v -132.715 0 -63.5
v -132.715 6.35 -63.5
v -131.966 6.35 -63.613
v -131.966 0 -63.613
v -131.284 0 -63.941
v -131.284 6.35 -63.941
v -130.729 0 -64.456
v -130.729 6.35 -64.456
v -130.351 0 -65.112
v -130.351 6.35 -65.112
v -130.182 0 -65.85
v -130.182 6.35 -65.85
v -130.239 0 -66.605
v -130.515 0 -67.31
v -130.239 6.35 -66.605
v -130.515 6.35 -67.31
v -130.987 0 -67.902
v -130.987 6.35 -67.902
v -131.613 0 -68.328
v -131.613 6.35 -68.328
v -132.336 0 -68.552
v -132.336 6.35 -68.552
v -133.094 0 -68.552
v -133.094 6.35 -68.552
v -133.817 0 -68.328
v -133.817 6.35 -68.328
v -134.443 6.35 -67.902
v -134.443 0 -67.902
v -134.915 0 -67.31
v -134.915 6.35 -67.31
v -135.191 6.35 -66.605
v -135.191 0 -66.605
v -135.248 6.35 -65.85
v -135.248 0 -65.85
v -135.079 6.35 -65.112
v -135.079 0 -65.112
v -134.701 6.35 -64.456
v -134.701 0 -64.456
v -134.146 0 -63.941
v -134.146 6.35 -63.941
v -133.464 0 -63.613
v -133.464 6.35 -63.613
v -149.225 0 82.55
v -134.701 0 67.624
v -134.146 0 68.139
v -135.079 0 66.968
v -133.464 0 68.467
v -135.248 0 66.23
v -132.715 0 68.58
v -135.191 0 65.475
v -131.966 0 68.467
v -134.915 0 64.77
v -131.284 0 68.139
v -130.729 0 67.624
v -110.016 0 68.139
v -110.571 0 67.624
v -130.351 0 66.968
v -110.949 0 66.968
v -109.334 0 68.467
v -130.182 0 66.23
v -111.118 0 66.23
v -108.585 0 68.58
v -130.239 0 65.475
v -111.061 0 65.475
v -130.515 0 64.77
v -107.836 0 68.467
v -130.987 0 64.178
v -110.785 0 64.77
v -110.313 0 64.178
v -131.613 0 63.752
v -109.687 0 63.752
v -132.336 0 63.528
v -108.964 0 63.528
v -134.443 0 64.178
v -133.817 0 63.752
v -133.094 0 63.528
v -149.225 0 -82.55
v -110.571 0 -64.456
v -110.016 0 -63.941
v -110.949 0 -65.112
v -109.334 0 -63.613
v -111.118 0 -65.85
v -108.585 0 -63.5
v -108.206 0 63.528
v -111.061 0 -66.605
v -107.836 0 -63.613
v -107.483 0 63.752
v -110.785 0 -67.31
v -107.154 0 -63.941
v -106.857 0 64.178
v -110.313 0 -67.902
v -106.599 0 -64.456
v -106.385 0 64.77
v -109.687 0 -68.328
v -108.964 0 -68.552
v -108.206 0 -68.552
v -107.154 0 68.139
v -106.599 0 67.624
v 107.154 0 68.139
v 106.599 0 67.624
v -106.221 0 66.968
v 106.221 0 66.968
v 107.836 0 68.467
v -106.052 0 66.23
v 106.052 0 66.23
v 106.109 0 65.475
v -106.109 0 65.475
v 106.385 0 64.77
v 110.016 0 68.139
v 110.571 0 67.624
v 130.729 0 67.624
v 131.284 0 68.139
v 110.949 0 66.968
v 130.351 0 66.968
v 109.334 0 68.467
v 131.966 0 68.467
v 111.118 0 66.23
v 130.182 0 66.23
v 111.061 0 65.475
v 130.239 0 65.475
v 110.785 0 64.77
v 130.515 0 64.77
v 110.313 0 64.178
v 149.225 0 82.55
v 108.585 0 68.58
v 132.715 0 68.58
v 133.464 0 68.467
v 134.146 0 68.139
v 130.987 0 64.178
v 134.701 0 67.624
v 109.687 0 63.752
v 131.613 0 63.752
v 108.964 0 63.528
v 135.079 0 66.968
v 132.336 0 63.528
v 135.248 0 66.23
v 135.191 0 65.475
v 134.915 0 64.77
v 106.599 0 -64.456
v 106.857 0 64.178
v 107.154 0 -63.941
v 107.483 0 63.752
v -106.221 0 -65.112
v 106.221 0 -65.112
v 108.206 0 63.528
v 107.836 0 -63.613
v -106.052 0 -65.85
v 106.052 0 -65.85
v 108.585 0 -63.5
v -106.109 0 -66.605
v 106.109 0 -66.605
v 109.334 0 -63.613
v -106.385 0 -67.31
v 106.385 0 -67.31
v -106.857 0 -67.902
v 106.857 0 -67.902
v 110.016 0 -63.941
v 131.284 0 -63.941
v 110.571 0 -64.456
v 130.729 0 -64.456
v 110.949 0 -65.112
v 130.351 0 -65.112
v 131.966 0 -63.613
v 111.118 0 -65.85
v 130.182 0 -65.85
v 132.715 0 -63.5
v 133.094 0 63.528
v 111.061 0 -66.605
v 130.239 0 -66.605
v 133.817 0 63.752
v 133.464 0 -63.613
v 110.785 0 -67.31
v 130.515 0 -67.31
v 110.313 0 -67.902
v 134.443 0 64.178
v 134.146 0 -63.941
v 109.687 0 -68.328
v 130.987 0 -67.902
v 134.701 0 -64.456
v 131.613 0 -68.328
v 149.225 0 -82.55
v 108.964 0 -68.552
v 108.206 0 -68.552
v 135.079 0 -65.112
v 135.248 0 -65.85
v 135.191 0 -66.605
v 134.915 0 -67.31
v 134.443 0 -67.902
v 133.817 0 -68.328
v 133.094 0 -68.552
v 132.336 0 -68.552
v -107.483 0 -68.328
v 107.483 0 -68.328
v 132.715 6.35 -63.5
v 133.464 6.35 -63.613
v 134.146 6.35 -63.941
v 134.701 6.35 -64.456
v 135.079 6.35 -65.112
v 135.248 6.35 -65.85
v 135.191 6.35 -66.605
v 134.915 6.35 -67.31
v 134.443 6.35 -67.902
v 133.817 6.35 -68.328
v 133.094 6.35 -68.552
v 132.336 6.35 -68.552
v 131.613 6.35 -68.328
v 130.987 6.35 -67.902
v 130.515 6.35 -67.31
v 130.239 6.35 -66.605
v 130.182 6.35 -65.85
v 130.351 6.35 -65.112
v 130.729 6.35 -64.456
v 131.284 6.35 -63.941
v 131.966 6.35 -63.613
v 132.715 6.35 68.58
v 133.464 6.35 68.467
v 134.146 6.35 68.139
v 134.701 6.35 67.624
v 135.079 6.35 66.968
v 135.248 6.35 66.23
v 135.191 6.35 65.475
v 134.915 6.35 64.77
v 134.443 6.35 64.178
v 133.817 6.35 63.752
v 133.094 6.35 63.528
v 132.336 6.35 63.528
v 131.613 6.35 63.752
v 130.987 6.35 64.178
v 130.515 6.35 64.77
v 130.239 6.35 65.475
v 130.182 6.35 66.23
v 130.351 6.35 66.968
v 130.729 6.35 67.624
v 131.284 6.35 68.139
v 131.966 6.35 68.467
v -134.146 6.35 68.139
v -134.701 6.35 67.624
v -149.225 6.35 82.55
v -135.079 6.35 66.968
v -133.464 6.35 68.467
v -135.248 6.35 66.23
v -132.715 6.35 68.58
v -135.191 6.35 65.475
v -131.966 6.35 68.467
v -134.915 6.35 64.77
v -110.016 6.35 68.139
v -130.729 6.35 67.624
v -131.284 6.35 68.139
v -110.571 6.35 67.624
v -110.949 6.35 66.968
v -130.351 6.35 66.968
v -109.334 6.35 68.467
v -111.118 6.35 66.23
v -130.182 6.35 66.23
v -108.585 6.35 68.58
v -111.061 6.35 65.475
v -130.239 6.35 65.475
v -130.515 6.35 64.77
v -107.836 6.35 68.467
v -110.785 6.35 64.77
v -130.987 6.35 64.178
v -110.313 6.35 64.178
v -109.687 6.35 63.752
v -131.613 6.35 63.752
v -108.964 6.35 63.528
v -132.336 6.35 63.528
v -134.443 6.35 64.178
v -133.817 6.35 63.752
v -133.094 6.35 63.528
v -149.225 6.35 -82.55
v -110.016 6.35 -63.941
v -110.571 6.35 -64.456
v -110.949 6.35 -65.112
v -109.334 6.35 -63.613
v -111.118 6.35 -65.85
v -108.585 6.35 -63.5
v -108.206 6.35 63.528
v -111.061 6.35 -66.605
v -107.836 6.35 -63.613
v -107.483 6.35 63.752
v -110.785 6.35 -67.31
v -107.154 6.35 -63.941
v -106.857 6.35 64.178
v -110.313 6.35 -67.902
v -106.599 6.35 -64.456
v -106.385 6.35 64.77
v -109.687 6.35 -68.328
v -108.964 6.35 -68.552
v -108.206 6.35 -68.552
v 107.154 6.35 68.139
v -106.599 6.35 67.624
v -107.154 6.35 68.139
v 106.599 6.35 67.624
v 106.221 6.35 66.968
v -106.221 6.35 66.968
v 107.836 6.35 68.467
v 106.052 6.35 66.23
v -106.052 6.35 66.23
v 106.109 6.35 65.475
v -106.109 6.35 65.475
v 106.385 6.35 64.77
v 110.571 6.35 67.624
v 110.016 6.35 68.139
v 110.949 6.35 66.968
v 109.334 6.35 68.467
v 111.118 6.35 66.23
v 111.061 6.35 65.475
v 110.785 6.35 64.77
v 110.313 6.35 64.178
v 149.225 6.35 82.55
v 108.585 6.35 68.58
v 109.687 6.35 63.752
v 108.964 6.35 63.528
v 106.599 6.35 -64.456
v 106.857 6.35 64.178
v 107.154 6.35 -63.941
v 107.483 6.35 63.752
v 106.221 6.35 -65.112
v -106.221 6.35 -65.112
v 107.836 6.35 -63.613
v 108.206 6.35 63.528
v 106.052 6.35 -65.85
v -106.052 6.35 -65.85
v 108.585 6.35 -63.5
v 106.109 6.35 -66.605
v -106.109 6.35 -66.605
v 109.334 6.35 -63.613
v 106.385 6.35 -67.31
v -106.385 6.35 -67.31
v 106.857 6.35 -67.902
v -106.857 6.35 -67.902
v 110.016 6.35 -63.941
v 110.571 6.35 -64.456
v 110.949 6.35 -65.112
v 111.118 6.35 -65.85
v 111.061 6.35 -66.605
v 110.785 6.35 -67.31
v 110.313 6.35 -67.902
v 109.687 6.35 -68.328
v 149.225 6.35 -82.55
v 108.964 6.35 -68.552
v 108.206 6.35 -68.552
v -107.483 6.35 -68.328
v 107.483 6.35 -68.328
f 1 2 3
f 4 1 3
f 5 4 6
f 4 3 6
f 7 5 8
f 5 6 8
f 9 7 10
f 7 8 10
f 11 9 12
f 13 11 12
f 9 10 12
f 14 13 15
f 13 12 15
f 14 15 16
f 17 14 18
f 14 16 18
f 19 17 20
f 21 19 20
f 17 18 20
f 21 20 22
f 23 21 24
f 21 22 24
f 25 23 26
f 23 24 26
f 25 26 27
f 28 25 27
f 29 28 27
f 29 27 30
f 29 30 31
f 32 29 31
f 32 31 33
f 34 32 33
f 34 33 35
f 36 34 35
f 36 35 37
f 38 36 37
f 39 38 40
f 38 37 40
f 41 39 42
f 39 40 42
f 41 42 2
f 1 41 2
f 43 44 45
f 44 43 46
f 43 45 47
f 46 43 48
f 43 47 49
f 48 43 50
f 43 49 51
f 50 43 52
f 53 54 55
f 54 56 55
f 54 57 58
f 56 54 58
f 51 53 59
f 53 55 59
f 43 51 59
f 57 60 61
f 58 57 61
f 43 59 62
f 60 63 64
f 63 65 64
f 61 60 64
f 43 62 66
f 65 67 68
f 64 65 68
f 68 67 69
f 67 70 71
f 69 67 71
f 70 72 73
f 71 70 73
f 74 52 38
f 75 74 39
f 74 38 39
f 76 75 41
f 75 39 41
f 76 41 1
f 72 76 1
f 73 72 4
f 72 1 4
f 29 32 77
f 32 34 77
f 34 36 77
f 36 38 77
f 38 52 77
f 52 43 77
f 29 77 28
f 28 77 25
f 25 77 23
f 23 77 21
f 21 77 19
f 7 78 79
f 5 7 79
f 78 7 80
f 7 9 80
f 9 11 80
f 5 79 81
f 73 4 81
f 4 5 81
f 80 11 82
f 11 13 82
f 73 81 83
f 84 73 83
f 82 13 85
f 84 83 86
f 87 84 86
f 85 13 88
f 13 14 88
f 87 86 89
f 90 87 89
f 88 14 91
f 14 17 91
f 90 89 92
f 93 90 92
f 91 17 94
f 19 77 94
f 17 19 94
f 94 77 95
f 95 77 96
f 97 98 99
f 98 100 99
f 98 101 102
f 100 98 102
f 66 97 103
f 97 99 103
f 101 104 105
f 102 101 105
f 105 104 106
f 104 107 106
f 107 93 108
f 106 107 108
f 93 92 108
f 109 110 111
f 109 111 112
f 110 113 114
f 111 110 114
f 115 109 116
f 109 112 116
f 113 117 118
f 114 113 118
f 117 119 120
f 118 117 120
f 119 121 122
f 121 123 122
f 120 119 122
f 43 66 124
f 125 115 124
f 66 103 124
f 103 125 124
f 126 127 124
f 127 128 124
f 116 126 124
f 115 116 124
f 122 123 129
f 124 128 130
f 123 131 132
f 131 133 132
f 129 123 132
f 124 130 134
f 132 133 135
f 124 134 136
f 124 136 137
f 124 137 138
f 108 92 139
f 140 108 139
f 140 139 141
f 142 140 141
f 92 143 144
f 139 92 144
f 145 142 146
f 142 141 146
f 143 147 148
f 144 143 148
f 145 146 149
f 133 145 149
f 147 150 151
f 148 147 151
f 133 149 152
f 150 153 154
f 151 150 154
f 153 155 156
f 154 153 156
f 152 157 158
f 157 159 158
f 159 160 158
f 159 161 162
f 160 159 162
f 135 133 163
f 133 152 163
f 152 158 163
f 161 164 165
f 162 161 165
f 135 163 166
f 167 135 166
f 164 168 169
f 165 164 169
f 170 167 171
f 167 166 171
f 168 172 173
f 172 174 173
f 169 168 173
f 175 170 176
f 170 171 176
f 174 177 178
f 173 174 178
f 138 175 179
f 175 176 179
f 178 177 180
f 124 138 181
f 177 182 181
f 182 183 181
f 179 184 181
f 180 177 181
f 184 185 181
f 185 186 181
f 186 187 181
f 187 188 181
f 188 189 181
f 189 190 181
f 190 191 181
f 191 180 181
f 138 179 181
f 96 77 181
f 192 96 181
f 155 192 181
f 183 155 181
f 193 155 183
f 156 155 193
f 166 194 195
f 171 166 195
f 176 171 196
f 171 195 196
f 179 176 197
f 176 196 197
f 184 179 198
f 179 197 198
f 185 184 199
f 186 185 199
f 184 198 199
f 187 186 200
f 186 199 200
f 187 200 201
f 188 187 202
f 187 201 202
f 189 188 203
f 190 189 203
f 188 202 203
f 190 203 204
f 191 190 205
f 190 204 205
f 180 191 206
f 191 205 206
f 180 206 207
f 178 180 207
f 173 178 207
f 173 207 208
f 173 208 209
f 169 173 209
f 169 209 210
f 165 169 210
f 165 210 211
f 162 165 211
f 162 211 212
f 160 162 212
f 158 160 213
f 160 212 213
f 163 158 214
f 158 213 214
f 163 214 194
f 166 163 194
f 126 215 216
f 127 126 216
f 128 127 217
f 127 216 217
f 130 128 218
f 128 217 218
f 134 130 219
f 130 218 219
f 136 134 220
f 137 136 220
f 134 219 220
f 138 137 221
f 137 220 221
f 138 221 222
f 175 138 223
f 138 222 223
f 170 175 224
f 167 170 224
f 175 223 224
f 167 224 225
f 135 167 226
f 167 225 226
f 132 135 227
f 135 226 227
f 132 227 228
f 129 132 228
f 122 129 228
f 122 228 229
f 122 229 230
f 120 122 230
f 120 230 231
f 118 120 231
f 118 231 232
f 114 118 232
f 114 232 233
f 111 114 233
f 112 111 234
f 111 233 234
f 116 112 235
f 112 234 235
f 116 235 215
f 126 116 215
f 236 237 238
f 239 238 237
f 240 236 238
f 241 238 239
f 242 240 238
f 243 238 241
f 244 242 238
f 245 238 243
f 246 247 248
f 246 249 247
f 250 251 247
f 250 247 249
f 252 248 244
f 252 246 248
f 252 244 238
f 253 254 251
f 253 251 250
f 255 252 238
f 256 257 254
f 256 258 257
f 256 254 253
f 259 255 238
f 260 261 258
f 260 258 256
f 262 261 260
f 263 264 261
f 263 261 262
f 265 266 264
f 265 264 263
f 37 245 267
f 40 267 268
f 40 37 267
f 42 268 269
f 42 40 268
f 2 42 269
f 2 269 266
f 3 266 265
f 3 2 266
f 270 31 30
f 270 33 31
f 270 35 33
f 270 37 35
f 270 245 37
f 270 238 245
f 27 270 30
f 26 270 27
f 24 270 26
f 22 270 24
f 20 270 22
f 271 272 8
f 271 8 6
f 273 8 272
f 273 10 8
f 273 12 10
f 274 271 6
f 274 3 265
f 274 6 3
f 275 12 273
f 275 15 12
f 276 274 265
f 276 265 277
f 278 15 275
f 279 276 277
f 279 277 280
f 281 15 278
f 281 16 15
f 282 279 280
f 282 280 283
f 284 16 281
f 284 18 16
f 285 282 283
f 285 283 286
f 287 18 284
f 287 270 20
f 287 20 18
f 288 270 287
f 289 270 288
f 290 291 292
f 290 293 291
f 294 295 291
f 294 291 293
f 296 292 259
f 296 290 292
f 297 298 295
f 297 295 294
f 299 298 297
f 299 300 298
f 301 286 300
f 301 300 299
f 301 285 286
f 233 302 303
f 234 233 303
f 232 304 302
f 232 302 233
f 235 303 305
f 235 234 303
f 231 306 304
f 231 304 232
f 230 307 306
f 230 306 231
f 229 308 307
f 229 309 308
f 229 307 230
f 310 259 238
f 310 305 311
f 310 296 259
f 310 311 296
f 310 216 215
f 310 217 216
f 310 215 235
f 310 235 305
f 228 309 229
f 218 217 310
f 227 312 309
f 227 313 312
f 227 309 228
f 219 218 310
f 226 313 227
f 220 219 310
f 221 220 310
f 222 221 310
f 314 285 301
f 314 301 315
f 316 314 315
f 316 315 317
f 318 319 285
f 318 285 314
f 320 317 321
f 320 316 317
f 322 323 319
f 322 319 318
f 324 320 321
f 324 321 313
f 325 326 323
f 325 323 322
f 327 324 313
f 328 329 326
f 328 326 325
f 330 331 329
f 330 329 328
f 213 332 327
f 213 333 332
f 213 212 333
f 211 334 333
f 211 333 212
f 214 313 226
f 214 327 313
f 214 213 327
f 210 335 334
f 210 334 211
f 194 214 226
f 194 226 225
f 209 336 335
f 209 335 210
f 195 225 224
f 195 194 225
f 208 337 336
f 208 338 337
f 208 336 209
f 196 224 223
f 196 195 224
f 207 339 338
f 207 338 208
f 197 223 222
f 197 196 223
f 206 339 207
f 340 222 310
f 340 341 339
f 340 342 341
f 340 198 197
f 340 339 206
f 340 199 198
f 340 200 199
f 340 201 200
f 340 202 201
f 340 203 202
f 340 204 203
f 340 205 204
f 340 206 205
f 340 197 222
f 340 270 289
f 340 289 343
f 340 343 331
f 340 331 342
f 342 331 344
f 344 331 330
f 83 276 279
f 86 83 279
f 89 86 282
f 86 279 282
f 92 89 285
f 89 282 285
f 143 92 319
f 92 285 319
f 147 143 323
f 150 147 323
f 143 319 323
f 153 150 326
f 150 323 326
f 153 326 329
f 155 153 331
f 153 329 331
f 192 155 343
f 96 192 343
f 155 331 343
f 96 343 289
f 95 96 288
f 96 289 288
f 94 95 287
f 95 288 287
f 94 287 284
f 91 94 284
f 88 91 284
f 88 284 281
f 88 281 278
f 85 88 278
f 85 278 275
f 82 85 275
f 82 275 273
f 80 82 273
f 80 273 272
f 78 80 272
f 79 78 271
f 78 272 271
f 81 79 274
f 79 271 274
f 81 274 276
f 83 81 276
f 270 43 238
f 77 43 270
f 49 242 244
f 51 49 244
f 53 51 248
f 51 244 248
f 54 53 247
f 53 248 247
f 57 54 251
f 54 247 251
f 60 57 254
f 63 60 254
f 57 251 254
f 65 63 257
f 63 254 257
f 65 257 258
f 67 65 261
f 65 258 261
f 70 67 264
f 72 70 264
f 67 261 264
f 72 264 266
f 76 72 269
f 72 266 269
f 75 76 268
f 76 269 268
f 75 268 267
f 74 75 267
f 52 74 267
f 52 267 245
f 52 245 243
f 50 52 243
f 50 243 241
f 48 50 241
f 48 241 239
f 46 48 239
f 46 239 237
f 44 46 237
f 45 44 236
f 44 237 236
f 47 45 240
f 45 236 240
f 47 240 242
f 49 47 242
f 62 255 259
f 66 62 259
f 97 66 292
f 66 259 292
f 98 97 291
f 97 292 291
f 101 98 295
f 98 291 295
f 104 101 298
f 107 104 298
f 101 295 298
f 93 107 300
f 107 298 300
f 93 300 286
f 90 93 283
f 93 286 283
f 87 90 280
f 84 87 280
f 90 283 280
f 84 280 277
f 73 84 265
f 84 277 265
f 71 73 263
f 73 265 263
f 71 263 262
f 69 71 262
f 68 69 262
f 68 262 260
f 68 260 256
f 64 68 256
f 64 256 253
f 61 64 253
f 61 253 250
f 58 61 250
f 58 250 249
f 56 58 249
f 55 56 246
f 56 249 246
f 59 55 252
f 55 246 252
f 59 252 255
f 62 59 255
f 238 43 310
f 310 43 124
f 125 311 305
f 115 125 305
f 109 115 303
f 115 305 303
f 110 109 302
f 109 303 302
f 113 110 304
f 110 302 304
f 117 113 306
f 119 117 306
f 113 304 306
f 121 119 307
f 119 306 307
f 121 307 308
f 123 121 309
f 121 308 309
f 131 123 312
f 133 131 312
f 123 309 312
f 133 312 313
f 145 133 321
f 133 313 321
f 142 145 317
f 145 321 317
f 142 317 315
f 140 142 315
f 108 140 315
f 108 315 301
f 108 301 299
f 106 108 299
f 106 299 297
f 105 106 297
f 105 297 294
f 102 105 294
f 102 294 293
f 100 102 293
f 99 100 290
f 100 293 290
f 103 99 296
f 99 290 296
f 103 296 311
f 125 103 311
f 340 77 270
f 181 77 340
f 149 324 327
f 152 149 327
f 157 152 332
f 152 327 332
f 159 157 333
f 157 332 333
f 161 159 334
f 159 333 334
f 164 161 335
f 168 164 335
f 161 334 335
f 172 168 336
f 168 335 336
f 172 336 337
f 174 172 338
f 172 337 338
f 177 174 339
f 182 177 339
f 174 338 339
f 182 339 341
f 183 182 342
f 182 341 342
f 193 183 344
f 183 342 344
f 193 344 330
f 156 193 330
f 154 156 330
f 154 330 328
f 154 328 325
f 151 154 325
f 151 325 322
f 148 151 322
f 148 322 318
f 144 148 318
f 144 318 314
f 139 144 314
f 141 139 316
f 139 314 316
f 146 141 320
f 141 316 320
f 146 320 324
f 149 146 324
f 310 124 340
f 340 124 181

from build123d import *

# Parameters (mm, degrees)
SKETCH1_W           = 298.45
SKETCH1_H           = 165.1
BOSS_EXTRUDE1_DEPTH = 6.35
SKETCH2_R           = 2.54
CUT_EXTRUDE1_DEPTH  = 6.35
SKETCH5_R           = 2.54
CUT_EXTRUDE2_DEPTH  = 6.35
SKETCH6_R           = 2.54
CUT_EXTRUDE3_DEPTH  = 6.35
SKETCH7_R           = 2.54
CUT_EXTRUDE4_DEPTH  = 6.35


with BuildPart() as part:
    # Sketch1 → Boss-Extrude1 (new body)
    with BuildSketch(Plane(origin=(0, 0, 0), x_dir=(1, 0, 0), z_dir=(0, 1, 0))):
        Rectangle(SKETCH1_W, SKETCH1_H)
    extrude(amount=BOSS_EXTRUDE1_DEPTH)

    # Sketch2 → Cut-Extrude1 (cut)
    with BuildSketch(Plane(origin=(0, 6.35, 0), x_dir=(1, 0, 0), z_dir=(0, 1, 0))):
        with Locations(Location((132.715, -66.04, 0), (0, 0, 270))):
            Circle(SKETCH2_R)
        with Locations(Location((108.585, -66.04, 0), (0, 0, 270))):
            Circle(SKETCH2_R)
    extrude(amount=-CUT_EXTRUDE1_DEPTH, mode=Mode.SUBTRACT)

    # Sketch5 → Cut-Extrude2 (cut)
    with BuildSketch(Plane(origin=(0, 6.35, 0), x_dir=(1, 0, 0), z_dir=(0, 1, 0))):
        with Locations(Location((-132.715, -66.04, 0), (0, 0, 270))):
            Circle(SKETCH5_R)
        with Locations(Location((-108.585, -66.04, 0), (0, 0, 270))):
            Circle(SKETCH5_R)
    extrude(amount=-CUT_EXTRUDE2_DEPTH, mode=Mode.SUBTRACT)

    # Sketch6 → Cut-Extrude3 (cut)
    with BuildSketch(Plane(origin=(0, 6.35, 0), x_dir=(1, 0, 0), z_dir=(0, 1, 0))):
        with Locations(Location((132.715, 66.04, 0), (0, 0, 270))):
            Circle(SKETCH6_R)
        with Locations(Location((108.585, 66.04, 0), (0, 0, 270))):
            Circle(SKETCH6_R)
    extrude(amount=-CUT_EXTRUDE3_DEPTH, mode=Mode.SUBTRACT)

    # Sketch7 → Cut-Extrude4 (cut)
    with BuildSketch(Plane(origin=(0, 6.35, 0), x_dir=(1, 0, 0), z_dir=(0, 1, 0))):
        with Locations(Location((-132.715, 66.04, 0), (0, 0, 270))):
            Circle(SKETCH7_R)
        with Locations(Location((-108.585, 66.04, 0), (0, 0, 270))):
            Circle(SKETCH7_R)
    extrude(amount=-CUT_EXTRUDE4_DEPTH, mode=Mode.SUBTRACT)


solid = part.part
